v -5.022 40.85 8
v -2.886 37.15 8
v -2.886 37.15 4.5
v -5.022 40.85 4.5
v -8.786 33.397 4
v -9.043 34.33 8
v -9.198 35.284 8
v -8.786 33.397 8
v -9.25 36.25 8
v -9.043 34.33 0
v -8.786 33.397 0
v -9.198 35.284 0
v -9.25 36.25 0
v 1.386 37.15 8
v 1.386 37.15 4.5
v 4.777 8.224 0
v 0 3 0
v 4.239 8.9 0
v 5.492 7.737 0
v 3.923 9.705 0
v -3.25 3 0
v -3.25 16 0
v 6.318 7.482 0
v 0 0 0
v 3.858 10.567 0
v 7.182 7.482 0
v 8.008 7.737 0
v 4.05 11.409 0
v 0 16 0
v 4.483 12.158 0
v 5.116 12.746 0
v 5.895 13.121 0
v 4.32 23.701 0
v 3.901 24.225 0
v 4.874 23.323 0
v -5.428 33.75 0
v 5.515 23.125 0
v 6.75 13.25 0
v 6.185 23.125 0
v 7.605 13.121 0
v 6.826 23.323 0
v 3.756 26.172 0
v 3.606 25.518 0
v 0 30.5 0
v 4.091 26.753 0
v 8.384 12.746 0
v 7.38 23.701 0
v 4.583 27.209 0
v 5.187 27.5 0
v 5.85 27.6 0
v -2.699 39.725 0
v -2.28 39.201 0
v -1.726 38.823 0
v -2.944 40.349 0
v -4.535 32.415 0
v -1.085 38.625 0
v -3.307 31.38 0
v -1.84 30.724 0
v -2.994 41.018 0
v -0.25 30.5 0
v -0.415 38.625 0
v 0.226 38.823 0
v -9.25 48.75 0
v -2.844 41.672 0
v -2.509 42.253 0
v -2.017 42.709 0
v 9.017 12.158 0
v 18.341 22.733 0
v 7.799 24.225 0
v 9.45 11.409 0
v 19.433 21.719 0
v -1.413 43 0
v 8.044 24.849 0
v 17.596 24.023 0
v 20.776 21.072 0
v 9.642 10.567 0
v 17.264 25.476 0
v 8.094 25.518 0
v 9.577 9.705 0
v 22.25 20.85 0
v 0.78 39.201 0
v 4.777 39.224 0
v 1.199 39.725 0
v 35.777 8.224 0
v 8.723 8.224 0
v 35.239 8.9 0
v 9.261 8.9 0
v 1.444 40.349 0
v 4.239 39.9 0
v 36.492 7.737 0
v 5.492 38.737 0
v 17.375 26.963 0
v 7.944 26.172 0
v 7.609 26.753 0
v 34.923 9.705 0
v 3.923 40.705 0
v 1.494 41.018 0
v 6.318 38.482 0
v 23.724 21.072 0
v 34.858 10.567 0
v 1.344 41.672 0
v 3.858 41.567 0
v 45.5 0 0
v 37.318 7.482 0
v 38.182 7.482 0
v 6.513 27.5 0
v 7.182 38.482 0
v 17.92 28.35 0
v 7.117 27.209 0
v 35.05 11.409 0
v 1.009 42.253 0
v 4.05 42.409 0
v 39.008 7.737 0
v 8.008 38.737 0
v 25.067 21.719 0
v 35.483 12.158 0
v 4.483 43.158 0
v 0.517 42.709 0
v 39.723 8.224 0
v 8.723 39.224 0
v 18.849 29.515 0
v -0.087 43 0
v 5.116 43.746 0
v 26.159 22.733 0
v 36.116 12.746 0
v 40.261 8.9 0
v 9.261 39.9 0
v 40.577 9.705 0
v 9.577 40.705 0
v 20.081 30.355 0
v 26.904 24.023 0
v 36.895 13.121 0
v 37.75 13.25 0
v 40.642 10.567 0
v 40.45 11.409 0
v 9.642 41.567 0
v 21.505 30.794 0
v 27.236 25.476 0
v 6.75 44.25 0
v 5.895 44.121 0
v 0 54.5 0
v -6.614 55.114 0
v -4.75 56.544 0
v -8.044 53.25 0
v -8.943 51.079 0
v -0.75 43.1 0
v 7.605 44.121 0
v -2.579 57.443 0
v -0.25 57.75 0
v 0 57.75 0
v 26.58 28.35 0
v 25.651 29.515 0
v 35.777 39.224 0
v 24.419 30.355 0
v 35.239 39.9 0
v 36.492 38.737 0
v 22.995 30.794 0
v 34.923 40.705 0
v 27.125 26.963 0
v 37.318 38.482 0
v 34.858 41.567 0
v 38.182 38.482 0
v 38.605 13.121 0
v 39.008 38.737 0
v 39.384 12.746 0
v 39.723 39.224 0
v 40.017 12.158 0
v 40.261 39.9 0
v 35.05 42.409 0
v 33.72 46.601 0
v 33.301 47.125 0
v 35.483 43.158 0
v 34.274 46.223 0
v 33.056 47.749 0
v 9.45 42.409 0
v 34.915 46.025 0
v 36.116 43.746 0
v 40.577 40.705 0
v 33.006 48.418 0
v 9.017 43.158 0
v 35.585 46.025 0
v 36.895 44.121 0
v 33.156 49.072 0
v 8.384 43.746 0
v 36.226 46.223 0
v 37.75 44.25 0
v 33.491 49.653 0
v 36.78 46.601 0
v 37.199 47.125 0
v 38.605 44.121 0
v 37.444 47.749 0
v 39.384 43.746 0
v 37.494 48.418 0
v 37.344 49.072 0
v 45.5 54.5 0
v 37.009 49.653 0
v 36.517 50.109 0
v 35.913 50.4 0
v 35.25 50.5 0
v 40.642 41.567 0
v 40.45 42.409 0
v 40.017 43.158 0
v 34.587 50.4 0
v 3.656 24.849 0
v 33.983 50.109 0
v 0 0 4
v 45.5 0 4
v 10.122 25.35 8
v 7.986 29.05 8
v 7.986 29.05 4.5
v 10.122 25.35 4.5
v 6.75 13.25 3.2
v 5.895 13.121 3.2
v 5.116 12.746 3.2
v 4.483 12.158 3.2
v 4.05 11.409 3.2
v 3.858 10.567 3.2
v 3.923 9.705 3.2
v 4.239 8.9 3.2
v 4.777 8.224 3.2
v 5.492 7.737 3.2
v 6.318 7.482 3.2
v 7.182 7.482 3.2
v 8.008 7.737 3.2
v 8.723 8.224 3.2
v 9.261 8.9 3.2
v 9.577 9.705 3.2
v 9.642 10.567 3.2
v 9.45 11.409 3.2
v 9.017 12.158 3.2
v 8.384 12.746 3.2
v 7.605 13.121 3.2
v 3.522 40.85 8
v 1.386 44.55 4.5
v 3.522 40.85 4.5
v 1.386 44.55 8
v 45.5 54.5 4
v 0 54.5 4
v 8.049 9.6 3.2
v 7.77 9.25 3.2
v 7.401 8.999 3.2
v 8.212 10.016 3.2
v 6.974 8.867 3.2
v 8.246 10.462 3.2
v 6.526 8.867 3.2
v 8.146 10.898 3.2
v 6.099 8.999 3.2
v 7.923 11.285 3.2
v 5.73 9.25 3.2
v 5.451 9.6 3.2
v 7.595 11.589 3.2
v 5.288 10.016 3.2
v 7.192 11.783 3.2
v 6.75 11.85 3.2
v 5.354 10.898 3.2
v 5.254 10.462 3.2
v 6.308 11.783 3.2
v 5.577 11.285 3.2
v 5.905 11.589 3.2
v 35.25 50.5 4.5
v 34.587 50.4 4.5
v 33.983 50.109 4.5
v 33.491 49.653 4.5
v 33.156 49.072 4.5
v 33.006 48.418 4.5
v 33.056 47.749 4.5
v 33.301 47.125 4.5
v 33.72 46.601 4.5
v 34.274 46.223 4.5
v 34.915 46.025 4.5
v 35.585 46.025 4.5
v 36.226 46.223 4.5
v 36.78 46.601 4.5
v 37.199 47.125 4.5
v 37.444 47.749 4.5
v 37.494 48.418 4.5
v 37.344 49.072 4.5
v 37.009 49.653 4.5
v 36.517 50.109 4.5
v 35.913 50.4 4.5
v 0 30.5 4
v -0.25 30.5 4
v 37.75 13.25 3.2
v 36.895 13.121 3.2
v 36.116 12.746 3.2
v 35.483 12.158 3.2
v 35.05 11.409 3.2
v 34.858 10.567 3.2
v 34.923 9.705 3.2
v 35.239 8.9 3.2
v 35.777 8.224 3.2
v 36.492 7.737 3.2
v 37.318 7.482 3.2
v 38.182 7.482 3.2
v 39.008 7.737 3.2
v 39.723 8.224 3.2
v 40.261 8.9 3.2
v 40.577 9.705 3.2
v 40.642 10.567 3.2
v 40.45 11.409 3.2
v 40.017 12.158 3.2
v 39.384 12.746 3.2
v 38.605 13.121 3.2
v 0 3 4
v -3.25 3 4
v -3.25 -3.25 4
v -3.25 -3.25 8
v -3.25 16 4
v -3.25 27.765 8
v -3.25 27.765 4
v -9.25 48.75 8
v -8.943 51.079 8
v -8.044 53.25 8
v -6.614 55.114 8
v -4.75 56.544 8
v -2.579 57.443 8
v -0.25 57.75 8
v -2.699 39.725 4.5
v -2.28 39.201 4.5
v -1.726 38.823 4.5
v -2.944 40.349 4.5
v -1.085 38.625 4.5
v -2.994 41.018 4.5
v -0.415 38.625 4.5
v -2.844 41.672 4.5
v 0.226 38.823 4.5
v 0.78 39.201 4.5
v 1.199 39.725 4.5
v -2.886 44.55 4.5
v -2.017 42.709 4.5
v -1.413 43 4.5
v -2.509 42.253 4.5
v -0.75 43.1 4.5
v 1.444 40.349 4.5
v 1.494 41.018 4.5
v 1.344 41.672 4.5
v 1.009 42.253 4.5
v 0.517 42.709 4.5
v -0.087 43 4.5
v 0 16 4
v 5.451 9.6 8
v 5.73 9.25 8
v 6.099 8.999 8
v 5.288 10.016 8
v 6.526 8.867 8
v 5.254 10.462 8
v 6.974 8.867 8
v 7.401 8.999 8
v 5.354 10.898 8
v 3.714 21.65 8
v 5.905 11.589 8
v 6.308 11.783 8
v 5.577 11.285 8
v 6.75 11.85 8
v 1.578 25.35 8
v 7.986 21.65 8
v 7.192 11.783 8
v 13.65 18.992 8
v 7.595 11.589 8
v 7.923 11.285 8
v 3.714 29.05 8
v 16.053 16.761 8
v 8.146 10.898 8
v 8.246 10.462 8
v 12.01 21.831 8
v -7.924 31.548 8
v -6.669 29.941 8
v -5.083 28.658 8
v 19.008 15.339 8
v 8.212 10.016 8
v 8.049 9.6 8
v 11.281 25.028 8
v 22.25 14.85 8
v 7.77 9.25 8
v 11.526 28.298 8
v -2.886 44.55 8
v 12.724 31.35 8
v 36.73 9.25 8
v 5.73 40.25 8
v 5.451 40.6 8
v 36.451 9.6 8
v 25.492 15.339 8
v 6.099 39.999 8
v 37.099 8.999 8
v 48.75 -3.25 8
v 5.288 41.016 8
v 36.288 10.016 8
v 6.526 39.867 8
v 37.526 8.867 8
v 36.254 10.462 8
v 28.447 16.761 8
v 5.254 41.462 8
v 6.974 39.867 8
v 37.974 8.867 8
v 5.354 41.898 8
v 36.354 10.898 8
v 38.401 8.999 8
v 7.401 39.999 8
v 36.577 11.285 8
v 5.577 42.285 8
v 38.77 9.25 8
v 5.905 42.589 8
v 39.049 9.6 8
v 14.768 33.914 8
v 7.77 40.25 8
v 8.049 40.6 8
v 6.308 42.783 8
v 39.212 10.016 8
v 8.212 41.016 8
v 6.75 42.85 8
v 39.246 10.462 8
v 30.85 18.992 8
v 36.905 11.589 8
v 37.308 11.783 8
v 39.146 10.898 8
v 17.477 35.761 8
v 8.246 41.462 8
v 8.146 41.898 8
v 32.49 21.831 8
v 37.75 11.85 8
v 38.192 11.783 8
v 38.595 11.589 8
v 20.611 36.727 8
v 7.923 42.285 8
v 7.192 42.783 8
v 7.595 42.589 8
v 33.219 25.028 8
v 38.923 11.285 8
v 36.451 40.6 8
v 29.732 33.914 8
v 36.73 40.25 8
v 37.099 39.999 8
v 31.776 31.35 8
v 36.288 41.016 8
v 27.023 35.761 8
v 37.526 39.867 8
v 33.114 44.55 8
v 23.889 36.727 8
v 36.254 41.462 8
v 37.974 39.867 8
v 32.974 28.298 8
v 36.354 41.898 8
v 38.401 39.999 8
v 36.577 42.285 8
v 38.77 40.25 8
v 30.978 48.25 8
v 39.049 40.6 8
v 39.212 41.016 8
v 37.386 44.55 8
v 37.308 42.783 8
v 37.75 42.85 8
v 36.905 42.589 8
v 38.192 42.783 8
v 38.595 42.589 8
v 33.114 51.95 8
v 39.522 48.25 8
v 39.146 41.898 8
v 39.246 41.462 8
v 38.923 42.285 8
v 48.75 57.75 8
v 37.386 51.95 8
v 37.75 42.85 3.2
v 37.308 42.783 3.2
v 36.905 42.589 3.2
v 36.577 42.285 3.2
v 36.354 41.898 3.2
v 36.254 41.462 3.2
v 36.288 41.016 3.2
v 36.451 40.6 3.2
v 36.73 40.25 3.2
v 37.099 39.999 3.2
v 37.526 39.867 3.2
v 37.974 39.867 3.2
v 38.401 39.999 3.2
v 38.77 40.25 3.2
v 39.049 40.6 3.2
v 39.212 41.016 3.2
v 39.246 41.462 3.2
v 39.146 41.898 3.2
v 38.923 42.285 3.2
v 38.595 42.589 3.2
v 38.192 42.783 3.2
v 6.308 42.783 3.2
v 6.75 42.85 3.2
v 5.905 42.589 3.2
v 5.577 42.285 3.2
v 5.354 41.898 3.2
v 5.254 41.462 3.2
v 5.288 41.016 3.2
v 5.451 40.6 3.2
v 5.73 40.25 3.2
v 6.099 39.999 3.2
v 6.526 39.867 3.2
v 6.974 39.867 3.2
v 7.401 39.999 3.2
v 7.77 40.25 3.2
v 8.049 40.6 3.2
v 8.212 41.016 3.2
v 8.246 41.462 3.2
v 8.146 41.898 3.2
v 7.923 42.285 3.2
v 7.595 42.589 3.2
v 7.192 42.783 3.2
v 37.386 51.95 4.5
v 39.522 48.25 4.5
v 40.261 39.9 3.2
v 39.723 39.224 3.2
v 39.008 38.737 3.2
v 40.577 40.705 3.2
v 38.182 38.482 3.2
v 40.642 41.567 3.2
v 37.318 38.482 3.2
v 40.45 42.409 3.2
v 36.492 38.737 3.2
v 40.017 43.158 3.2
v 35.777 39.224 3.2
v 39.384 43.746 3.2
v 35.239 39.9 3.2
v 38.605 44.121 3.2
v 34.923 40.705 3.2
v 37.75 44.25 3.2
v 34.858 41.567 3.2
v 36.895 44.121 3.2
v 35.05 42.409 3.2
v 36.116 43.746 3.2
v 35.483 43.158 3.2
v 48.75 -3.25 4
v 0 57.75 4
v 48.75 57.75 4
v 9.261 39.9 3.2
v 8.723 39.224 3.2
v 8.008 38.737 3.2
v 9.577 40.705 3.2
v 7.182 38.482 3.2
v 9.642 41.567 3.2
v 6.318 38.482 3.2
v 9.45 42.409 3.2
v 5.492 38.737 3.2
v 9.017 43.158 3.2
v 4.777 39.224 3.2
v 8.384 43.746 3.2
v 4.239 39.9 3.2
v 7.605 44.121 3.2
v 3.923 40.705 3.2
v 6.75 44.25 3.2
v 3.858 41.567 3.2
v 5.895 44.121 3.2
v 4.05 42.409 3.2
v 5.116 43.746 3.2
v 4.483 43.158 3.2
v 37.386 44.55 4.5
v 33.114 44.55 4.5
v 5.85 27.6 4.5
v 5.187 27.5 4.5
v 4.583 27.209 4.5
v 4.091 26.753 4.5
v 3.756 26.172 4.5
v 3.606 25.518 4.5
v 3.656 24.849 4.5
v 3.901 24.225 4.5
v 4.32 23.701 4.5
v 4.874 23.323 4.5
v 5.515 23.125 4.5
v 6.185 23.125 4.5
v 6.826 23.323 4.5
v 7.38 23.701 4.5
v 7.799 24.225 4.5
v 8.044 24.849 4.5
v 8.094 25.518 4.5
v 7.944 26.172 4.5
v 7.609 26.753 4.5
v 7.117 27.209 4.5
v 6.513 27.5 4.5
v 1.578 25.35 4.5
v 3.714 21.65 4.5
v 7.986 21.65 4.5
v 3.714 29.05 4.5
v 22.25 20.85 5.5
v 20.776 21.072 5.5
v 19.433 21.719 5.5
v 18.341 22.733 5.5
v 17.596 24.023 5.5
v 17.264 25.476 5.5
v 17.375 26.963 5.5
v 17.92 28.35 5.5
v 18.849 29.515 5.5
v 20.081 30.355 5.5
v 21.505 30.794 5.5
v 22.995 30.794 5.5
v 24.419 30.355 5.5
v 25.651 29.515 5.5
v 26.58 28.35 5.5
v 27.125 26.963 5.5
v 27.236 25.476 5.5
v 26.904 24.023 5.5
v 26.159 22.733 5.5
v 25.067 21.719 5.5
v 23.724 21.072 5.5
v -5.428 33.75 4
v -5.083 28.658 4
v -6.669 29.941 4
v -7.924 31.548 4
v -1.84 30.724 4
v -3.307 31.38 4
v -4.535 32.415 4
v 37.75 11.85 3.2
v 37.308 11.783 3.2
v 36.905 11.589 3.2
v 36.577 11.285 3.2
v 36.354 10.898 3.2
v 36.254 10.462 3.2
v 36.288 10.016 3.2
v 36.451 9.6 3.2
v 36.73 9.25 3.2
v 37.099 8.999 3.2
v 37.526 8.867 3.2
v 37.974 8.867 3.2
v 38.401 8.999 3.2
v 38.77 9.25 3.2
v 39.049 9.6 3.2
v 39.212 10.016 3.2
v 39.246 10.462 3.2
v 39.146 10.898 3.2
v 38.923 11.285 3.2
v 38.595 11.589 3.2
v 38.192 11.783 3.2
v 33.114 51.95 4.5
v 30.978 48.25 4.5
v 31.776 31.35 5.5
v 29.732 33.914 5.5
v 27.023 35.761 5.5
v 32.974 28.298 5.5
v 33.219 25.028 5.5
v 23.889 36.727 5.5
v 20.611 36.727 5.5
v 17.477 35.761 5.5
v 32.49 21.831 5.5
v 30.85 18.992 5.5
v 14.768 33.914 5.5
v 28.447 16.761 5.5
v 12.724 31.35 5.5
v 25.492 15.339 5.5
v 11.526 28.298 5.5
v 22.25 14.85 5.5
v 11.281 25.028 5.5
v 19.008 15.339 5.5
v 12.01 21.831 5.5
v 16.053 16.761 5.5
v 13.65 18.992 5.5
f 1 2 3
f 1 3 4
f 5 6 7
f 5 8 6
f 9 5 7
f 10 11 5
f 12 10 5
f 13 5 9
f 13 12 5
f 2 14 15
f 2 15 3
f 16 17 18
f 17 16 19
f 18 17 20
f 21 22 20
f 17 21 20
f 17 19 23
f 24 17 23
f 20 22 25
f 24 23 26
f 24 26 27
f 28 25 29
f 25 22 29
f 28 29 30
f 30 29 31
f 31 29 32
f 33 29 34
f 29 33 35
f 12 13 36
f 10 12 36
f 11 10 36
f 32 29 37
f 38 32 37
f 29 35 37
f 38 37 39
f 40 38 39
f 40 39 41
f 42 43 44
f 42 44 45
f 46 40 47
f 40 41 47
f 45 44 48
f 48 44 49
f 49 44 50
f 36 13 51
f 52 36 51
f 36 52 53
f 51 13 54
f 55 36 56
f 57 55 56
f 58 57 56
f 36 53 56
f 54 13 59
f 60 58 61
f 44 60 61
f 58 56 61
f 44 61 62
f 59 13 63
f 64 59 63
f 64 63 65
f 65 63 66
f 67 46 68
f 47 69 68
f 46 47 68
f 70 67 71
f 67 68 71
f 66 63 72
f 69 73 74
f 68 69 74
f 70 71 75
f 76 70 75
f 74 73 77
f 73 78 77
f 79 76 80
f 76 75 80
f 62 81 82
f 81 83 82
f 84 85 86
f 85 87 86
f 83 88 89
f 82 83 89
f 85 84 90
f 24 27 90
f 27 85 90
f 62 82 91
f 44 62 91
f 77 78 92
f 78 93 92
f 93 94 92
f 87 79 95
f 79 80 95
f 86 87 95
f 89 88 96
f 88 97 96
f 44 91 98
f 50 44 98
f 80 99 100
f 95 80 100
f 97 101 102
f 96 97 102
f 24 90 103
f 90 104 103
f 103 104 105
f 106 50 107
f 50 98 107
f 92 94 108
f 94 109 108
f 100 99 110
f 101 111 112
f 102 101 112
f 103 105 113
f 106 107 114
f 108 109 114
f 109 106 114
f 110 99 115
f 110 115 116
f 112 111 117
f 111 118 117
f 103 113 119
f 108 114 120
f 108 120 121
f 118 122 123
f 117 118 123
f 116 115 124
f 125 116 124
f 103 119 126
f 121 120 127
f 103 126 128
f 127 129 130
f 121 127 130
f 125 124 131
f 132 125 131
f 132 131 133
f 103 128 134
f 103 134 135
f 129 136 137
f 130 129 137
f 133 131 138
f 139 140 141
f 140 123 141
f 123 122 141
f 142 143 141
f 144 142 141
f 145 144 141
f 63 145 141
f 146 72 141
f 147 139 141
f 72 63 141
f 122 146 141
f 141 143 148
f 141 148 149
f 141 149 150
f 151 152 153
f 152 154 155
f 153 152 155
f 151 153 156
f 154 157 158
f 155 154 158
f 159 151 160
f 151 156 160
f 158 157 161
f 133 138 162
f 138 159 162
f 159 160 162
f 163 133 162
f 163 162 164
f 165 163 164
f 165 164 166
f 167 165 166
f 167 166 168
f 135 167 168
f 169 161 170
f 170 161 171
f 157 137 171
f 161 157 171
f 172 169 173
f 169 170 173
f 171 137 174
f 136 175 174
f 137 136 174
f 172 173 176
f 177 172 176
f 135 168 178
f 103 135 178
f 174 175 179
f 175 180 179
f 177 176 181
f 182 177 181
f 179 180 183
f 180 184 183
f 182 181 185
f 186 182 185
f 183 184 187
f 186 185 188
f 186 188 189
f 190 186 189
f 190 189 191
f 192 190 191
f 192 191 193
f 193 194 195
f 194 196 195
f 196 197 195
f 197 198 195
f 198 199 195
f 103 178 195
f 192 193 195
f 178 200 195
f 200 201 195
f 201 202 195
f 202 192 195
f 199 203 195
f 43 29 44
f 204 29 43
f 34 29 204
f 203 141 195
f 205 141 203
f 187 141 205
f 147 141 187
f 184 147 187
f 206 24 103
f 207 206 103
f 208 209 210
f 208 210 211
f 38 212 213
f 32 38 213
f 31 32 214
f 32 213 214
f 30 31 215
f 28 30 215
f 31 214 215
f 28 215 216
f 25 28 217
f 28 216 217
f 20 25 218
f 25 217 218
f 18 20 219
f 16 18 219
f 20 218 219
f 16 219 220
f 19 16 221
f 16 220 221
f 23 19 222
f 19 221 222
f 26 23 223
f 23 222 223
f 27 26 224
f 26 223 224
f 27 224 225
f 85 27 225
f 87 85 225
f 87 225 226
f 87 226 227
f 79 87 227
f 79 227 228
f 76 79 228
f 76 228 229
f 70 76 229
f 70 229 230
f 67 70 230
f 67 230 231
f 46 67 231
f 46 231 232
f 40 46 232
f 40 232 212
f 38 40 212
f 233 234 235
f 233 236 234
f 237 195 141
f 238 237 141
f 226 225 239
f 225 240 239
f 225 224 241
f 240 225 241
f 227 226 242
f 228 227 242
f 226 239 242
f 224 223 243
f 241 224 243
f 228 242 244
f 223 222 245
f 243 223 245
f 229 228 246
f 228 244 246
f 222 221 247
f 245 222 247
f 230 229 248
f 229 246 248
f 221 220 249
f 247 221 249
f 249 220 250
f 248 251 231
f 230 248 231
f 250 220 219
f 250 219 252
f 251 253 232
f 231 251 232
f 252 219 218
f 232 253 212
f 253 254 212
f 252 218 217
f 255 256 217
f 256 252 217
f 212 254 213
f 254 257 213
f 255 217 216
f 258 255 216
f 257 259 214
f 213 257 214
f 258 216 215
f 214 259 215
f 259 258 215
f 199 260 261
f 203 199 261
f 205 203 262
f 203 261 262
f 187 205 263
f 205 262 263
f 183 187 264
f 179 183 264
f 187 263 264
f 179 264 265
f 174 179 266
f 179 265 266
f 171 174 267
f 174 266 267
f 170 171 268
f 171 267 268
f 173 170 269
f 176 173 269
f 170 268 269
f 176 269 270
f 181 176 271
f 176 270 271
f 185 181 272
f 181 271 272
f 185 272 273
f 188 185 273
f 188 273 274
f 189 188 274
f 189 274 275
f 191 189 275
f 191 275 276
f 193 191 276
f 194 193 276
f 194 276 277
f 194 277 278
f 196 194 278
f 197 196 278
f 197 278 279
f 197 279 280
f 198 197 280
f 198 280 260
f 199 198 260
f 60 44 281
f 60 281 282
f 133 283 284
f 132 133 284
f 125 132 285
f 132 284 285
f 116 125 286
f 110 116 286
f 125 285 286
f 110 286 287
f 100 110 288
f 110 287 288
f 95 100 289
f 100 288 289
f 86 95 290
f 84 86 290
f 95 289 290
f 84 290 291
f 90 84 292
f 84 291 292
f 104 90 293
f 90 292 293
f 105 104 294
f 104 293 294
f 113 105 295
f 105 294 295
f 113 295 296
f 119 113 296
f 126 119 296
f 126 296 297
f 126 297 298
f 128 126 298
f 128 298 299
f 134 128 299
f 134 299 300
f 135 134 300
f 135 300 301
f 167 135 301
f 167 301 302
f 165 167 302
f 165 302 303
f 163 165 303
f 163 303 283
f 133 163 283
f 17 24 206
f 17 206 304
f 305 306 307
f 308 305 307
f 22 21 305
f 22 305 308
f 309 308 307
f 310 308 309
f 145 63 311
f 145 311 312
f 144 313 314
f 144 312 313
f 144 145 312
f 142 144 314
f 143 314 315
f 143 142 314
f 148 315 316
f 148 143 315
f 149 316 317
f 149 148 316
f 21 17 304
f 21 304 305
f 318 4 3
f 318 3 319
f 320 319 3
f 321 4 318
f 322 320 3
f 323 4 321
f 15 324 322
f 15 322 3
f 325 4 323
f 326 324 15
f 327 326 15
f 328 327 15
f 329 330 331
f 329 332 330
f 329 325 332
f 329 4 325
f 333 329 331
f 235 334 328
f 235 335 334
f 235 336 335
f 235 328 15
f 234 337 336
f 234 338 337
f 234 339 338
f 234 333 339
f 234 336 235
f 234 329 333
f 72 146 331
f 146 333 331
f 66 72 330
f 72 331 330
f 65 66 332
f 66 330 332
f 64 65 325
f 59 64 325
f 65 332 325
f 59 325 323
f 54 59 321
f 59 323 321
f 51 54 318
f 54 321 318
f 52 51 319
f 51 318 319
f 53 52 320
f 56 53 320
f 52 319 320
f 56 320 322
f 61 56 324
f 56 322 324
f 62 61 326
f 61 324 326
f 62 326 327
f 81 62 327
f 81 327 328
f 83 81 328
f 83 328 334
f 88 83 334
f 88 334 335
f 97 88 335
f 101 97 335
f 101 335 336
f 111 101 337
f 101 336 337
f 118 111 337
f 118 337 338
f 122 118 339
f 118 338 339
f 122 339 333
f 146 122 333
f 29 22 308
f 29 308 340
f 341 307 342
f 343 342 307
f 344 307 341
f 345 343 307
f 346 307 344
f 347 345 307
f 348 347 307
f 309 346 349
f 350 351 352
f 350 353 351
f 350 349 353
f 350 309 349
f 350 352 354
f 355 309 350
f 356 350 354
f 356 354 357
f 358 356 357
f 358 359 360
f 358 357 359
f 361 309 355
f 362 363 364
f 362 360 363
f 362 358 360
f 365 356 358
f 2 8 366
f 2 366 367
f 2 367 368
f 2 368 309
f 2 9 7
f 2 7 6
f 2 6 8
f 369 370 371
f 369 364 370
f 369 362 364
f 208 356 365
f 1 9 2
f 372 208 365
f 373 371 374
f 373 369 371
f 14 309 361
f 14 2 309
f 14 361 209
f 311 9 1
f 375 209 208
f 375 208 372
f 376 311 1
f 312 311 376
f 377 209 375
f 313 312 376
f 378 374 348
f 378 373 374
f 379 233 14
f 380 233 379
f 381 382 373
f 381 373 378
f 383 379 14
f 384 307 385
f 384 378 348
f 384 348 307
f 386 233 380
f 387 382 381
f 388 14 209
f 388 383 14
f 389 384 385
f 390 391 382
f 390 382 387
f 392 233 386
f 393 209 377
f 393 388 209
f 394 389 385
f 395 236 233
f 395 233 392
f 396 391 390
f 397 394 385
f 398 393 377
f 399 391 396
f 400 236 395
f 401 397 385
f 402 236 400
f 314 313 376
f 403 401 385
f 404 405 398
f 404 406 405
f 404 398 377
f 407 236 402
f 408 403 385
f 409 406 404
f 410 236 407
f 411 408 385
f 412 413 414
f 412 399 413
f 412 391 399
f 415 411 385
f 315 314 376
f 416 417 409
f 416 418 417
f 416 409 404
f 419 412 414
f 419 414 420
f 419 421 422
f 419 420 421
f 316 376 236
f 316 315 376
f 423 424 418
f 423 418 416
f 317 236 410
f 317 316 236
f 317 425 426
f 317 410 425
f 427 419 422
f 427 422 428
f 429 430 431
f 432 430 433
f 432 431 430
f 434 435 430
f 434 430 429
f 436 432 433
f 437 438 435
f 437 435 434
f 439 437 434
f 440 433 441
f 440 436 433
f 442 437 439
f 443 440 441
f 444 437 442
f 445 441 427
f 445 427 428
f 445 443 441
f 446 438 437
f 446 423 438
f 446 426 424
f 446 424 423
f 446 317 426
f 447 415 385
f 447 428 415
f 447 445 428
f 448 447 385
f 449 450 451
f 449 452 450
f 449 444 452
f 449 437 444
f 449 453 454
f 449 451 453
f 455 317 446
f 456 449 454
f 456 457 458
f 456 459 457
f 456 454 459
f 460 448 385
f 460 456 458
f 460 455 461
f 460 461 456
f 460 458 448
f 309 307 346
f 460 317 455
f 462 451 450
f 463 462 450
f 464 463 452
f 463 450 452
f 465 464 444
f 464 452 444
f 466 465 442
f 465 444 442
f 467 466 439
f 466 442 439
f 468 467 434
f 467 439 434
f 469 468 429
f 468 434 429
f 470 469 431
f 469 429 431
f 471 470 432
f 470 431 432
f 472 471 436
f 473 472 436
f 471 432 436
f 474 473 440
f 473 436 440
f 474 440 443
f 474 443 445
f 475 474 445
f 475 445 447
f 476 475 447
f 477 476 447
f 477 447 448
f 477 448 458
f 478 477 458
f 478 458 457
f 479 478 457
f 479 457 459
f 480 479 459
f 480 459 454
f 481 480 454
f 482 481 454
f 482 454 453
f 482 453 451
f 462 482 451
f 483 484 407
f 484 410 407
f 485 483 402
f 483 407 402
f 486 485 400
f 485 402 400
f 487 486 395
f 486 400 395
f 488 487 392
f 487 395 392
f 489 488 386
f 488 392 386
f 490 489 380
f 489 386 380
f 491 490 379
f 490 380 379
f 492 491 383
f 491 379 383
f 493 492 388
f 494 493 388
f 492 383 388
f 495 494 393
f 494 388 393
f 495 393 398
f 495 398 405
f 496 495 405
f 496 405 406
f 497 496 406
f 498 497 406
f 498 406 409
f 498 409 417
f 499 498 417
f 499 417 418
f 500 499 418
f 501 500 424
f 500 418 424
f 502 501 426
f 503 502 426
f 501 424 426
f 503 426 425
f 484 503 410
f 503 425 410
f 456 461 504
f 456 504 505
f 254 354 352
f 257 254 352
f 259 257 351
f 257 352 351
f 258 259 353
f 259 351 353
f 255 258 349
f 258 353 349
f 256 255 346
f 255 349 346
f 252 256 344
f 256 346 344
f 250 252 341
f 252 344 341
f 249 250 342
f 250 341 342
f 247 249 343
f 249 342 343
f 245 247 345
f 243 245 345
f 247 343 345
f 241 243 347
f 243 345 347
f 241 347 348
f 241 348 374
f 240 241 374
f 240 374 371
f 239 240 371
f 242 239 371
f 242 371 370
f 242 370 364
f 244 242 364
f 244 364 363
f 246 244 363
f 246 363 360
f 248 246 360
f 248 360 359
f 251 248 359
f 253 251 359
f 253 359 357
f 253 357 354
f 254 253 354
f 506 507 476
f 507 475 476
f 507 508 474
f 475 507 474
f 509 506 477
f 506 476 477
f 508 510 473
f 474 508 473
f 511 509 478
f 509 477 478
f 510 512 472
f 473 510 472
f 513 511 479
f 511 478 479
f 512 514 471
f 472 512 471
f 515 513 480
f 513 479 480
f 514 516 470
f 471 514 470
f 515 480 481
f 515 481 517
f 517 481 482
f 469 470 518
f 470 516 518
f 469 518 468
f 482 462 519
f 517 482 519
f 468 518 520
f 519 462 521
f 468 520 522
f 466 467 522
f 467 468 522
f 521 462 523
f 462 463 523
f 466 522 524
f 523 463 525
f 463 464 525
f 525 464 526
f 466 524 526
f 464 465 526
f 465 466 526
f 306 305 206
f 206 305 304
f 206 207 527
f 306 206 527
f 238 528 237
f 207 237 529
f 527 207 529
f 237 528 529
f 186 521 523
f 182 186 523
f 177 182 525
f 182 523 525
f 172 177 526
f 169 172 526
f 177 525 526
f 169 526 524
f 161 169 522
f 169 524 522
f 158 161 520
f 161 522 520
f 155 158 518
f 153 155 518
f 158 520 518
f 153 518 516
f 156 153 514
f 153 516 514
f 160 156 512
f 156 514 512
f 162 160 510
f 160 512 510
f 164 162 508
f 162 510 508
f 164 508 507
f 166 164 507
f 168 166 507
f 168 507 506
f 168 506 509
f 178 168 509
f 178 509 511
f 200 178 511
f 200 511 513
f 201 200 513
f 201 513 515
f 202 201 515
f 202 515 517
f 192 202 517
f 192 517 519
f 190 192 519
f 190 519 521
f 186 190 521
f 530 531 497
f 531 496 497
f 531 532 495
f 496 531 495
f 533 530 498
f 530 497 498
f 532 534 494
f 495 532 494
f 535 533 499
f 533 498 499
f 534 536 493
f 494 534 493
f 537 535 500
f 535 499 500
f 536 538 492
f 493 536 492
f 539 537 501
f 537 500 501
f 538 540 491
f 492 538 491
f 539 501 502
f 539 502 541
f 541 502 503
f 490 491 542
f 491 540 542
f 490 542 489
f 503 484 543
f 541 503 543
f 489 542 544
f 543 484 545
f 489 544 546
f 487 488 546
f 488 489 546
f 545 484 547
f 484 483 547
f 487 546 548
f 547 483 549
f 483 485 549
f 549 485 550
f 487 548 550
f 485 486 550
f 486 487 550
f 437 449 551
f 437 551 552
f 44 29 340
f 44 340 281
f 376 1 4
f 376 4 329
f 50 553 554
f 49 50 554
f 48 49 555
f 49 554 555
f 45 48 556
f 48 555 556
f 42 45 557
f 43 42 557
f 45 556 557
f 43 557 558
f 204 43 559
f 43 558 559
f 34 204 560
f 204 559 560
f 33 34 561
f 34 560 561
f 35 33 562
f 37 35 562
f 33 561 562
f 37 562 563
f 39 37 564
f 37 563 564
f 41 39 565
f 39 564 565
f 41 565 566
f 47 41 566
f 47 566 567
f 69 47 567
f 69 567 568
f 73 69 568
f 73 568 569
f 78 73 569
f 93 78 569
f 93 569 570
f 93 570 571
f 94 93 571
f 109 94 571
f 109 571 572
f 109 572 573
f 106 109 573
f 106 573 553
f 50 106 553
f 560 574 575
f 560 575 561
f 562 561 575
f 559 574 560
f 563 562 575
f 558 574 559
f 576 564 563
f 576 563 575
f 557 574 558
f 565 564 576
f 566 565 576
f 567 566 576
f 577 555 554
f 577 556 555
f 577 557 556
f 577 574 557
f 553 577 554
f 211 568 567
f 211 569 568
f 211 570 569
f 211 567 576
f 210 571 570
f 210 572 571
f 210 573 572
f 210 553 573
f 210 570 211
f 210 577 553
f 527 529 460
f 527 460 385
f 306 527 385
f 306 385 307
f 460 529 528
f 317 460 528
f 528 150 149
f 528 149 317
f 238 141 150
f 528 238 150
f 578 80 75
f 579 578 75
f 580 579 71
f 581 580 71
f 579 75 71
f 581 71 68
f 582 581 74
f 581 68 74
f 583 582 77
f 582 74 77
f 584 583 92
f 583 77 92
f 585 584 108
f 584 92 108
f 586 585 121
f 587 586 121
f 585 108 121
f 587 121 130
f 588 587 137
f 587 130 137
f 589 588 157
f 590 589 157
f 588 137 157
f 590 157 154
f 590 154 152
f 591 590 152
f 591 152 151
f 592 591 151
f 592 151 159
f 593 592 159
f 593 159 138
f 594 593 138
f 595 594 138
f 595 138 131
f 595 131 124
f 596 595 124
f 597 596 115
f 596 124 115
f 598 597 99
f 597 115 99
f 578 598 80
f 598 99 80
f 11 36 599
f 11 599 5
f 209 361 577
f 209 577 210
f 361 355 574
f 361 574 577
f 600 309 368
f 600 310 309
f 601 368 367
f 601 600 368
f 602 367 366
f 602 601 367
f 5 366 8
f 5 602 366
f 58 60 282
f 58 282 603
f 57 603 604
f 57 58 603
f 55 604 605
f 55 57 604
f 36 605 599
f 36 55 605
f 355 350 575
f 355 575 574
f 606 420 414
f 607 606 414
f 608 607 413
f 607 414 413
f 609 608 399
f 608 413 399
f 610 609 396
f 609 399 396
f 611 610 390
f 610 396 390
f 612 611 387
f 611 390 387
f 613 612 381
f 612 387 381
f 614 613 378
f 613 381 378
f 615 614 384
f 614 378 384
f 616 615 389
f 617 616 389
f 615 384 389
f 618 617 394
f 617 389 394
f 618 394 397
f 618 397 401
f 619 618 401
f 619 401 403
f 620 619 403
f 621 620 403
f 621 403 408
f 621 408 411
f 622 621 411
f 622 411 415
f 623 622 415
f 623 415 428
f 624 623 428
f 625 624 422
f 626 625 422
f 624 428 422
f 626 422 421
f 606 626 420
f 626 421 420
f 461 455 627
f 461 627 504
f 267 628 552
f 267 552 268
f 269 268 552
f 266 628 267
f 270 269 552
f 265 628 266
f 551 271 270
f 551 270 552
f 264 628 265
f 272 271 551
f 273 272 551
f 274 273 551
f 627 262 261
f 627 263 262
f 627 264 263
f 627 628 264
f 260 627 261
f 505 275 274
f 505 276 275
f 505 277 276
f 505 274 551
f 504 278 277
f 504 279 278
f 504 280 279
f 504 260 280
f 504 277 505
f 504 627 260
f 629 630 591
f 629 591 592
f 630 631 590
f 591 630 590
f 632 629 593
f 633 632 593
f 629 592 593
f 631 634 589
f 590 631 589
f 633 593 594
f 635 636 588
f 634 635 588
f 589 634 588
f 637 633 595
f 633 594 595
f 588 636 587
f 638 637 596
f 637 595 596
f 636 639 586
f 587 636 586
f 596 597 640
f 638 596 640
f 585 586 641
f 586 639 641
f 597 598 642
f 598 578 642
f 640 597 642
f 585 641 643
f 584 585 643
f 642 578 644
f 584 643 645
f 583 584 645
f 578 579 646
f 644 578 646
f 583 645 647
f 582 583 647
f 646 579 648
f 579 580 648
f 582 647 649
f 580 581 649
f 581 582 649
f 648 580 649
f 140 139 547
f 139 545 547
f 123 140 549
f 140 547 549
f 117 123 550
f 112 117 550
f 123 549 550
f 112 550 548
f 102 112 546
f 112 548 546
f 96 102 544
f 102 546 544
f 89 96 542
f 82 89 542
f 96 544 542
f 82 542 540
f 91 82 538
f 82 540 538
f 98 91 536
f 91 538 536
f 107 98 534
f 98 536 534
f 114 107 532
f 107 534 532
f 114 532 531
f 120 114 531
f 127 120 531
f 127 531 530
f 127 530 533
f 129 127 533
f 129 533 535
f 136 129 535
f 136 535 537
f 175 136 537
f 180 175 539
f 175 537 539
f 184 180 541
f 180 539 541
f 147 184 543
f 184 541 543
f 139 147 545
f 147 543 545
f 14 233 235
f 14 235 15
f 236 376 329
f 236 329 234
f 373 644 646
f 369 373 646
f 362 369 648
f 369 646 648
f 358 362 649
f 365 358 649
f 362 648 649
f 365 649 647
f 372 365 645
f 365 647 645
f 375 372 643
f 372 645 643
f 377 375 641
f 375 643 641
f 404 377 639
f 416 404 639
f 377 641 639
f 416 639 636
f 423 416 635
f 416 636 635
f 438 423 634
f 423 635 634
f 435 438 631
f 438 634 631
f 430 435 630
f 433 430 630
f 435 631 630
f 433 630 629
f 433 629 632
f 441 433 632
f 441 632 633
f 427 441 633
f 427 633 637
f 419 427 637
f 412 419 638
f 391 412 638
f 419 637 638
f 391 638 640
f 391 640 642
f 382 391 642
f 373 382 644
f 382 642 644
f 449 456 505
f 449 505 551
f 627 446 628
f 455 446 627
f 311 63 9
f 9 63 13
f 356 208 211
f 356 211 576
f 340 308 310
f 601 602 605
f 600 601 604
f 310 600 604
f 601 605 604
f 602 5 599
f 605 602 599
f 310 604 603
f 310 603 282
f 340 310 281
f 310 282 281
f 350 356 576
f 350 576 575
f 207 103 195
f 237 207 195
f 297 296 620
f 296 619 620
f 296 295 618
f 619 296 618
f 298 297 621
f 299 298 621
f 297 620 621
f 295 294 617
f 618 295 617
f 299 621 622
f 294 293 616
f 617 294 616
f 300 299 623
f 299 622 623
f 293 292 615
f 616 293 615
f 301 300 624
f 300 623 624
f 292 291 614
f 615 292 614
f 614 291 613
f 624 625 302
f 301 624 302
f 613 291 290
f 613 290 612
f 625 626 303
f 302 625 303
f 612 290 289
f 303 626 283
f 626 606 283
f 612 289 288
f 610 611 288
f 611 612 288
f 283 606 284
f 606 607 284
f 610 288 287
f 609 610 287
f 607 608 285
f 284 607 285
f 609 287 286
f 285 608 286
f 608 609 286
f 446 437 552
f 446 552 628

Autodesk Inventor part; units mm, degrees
ref_plane "YZ Plane" through (0, 0, 0) normal (1, 0, 0) x (0, 1, 0)
ref_plane "XZ Plane" through (0, 0, 0) normal (0, 1, 0) x (-1, 0, 0)
ref_plane "XY Plane" through (0, 0, 0) normal (0, 0, 1) x (1, 0, 0)
sketch "Sketch1" plane through (0, 0, 0) normal (0, 0, 1) x (1, 0, 0)
  line L0 (0, 0) -> (45.5, 0)
  line L1 (45.5, 0) -> (45.5, 54.5)
  line L2 (0, 30.5) -> (-0.25, 30.5)
  line L3 (45.5, 54.5) -> (0, 54.5)
  line L4 (-5.4281, 33.75) -> (-8.7859, 33.3971)
  arc A0 (-9.25, 36.25) -> (-8.7859, 33.3971) centre (-0.25, 36.25) ccw
  arc A1 (-0.25, 57.75) -> (-9.25, 48.75) centre (-0.25, 48.75) ccw
  line L5 (-9.25, 48.75) -> (-9.25, 36.25)
  line L6 (0, 0) -> (0, 3)
  line L7 (0, 3) -> (-3.25, 3)
  line L8 (-3.25, 3) -> (-3.25, 16)
  line L9 (-3.25, 16) -> (0, 16)
  line L10 (0, 16) -> (0, 30.5)
  arc A2 (-5.4281, 33.75) -> (-0.25, 30.5) centre (-0.25, 36.25) ccw
  line L11 (0, 54.5) -> (0, 57.75)
  line L12 (0, 57.75) -> (-0.25, 57.75)
  dimension "d0" = 45.5
  dimension "d1" = 54.5
  dimension "d9" = 84
  dimension "d10" = 13
  dimension "d11" = 3
  dimension "d12" = 3.25
  dimension "d13" = 14.5
  dimension "d18" = 9
  dimension "d19" = 54.75
  dimension "d24" = 12.5
  dimension "d27" = 5.75
  dimension "d30" = 3.25
  dimension "d31" = 45.5
  dimension "d68" = 0.25
  dimension "d69" = 3.25
extrude "Extrusion1" add sketch "Sketch1" along normal blind 4
sketch "Sketch2" plane through (0, 0, 4) normal (0, 0, 1) x (1, 0, 0)
  line L0 (0, 0) -> (45.5, 0) projected
  line L1 (0, 57.75) -> (-0.25, 57.75) projected
  arc A0 (-0.25, 57.75) -> (-9.25, 48.75) centre (-0.25, 48.75) ccw projected
  line L2 (-9.25, 48.75) -> (-9.25, 36.25) projected
  arc A1 (-9.25, 36.25) -> (-8.7859, 33.3971) centre (-0.25, 36.25) ccw projected
  arc A2 (-5.4281, 33.75) -> (-0.25, 30.5) centre (-0.25, 36.25) ccw projected
  line L3 (-3.25, 16) -> (-3.25, 3) projected
  arc A3 (-9.25, 36.25) -> (-3.25, 27.7647) centre (-0.25, 36.25) ccw
  line L4 (0, 57.75) -> (48.75, 57.75)
  line L5 (48.75, 57.75) -> (48.75, -3.25)
  line L6 (48.75, -3.25) -> (-3.25, -3.25)
  line L7 (-3.25, 27.7647) -> (-3.25, -3.25)
  dimension "d32" = 48.75
  dimension "d33" = 61
extrude "Extrusion2" add sketch "Sketch2" along normal blind 4
sketch "Sketch4" plane through (0, 0, 0) normal (0, 0, -1) x (-1, 0, 0)
  line L0 (-48.75, 57.75) -> (0, 57.75) projected
  line L1 (-48.75, -3.25) -> (-48.75, 57.75) projected
  point P0 (-37.75, 41.35)
  point P1 (-6.75, 41.35)
  point P2 (-37.75, 10.35)
  point P3 (-6.75, 10.35)
  dimension "d39" = 31
  dimension "d40" = 31
  dimension "d41" = 16.4
  dimension "d42" = 11
hole "Hole1" at (37.75, 41.35, 0) at (6.75, 41.35, 0) at (37.75, 10.35, 0) at (6.75, 10.35, 0) direction (0, 0, 1) diameter 3 end through all counterbore diameter 5.8 counterbore depth 3.2
sketch "Sketch5" plane through (0, 0, 8) normal (0, 0, 1) x (1, 0, 0)
  circle A0 centre (37.75, 10.35) radius 1.5 projected
  circle A1 centre (37.75, 41.35) radius 1.5 projected
  circle A2 centre (6.75, 41.35) radius 1.5 projected
  circle A3 centre (6.75, 10.35) radius 1.5 projected
  line L0 (6.75, 41.35) -> (37.75, 10.35) construction
  line L1 (37.75, 41.35) -> (6.75, 10.35) construction
  point P0 (0, 0)
  point P1 (22.25, 25.85)
hole "Hole2" at (22.25, 25.85, 8) direction (0, 0, -1) diameter 10 end through all counterbore diameter 22 counterbore depth 2.5
sketch "Sketch6" plane through (0, 0, 0) normal (0, 0, -1) x (-1, 0, 0)
  circle A0 centre (-6.75, 41.35) radius 2.9 projected
  circle A1 centre (-6.75, 10.35) radius 2.9 projected
  circle A2 centre (-35.25, 48.25) radius 2.25 projected
  circle A3 centre (0.75, 40.85) radius 2.25 projected
  circle A4 centre (-5.85, 25.35) radius 2.25 projected
hole "Hole3" at (35.25, 48.25, 0) at (-0.75, 40.85, 0) at (5.85, 25.35, 0) direction (0, 0, 1) diameter 4.5 end through all
sketch "Sketch7" plane through (0, 0, 8) normal (0, 0, 1) x (1, 0, 0)
  circle A0 centre (-0.75, 40.85) radius 2.25 projected
  circle A1 centre (35.25, 48.25) radius 2.25 projected
  circle A2 centre (5.85, 25.35) radius 2.25 projected
  line L0 (3.5224, 40.85) -> (1.3862, 37.15)
  line L1 (1.3862, 37.15) -> (-2.8862, 37.15)
  line L2 (-2.8862, 37.15) -> (-5.0224, 40.85)
  line L3 (-5.0224, 40.85) -> (-2.8862, 44.55)
  line L4 (-2.8862, 44.55) -> (1.3862, 44.55)
  line L5 (1.3862, 44.55) -> (3.5224, 40.85)
  line L6 (39.5224, 48.25) -> (37.3862, 44.55)
  line L7 (37.3862, 44.55) -> (33.1138, 44.55)
  line L8 (33.1138, 44.55) -> (30.9776, 48.25)
  line L9 (30.9776, 48.25) -> (33.1138, 51.95)
  line L10 (33.1138, 51.95) -> (37.3862, 51.95)
  line L11 (37.3862, 51.95) -> (39.5224, 48.25)
  line L12 (10.1224, 25.35) -> (7.9862, 21.65)
  line L13 (7.9862, 21.65) -> (3.7138, 21.65)
  line L14 (3.7138, 21.65) -> (1.5776, 25.35)
  line L15 (1.5776, 25.35) -> (3.7138, 29.05)
  line L16 (3.7138, 29.05) -> (7.9862, 29.05)
  line L17 (7.9862, 29.05) -> (10.1224, 25.35)
  point P0 (0, 0)
  dimension "d64" = 7.4
extrude "Extrusion3" cut sketch "Sketch7" against normal blind 3.5
properties part number "ExtruderSatoerMotorMount"
